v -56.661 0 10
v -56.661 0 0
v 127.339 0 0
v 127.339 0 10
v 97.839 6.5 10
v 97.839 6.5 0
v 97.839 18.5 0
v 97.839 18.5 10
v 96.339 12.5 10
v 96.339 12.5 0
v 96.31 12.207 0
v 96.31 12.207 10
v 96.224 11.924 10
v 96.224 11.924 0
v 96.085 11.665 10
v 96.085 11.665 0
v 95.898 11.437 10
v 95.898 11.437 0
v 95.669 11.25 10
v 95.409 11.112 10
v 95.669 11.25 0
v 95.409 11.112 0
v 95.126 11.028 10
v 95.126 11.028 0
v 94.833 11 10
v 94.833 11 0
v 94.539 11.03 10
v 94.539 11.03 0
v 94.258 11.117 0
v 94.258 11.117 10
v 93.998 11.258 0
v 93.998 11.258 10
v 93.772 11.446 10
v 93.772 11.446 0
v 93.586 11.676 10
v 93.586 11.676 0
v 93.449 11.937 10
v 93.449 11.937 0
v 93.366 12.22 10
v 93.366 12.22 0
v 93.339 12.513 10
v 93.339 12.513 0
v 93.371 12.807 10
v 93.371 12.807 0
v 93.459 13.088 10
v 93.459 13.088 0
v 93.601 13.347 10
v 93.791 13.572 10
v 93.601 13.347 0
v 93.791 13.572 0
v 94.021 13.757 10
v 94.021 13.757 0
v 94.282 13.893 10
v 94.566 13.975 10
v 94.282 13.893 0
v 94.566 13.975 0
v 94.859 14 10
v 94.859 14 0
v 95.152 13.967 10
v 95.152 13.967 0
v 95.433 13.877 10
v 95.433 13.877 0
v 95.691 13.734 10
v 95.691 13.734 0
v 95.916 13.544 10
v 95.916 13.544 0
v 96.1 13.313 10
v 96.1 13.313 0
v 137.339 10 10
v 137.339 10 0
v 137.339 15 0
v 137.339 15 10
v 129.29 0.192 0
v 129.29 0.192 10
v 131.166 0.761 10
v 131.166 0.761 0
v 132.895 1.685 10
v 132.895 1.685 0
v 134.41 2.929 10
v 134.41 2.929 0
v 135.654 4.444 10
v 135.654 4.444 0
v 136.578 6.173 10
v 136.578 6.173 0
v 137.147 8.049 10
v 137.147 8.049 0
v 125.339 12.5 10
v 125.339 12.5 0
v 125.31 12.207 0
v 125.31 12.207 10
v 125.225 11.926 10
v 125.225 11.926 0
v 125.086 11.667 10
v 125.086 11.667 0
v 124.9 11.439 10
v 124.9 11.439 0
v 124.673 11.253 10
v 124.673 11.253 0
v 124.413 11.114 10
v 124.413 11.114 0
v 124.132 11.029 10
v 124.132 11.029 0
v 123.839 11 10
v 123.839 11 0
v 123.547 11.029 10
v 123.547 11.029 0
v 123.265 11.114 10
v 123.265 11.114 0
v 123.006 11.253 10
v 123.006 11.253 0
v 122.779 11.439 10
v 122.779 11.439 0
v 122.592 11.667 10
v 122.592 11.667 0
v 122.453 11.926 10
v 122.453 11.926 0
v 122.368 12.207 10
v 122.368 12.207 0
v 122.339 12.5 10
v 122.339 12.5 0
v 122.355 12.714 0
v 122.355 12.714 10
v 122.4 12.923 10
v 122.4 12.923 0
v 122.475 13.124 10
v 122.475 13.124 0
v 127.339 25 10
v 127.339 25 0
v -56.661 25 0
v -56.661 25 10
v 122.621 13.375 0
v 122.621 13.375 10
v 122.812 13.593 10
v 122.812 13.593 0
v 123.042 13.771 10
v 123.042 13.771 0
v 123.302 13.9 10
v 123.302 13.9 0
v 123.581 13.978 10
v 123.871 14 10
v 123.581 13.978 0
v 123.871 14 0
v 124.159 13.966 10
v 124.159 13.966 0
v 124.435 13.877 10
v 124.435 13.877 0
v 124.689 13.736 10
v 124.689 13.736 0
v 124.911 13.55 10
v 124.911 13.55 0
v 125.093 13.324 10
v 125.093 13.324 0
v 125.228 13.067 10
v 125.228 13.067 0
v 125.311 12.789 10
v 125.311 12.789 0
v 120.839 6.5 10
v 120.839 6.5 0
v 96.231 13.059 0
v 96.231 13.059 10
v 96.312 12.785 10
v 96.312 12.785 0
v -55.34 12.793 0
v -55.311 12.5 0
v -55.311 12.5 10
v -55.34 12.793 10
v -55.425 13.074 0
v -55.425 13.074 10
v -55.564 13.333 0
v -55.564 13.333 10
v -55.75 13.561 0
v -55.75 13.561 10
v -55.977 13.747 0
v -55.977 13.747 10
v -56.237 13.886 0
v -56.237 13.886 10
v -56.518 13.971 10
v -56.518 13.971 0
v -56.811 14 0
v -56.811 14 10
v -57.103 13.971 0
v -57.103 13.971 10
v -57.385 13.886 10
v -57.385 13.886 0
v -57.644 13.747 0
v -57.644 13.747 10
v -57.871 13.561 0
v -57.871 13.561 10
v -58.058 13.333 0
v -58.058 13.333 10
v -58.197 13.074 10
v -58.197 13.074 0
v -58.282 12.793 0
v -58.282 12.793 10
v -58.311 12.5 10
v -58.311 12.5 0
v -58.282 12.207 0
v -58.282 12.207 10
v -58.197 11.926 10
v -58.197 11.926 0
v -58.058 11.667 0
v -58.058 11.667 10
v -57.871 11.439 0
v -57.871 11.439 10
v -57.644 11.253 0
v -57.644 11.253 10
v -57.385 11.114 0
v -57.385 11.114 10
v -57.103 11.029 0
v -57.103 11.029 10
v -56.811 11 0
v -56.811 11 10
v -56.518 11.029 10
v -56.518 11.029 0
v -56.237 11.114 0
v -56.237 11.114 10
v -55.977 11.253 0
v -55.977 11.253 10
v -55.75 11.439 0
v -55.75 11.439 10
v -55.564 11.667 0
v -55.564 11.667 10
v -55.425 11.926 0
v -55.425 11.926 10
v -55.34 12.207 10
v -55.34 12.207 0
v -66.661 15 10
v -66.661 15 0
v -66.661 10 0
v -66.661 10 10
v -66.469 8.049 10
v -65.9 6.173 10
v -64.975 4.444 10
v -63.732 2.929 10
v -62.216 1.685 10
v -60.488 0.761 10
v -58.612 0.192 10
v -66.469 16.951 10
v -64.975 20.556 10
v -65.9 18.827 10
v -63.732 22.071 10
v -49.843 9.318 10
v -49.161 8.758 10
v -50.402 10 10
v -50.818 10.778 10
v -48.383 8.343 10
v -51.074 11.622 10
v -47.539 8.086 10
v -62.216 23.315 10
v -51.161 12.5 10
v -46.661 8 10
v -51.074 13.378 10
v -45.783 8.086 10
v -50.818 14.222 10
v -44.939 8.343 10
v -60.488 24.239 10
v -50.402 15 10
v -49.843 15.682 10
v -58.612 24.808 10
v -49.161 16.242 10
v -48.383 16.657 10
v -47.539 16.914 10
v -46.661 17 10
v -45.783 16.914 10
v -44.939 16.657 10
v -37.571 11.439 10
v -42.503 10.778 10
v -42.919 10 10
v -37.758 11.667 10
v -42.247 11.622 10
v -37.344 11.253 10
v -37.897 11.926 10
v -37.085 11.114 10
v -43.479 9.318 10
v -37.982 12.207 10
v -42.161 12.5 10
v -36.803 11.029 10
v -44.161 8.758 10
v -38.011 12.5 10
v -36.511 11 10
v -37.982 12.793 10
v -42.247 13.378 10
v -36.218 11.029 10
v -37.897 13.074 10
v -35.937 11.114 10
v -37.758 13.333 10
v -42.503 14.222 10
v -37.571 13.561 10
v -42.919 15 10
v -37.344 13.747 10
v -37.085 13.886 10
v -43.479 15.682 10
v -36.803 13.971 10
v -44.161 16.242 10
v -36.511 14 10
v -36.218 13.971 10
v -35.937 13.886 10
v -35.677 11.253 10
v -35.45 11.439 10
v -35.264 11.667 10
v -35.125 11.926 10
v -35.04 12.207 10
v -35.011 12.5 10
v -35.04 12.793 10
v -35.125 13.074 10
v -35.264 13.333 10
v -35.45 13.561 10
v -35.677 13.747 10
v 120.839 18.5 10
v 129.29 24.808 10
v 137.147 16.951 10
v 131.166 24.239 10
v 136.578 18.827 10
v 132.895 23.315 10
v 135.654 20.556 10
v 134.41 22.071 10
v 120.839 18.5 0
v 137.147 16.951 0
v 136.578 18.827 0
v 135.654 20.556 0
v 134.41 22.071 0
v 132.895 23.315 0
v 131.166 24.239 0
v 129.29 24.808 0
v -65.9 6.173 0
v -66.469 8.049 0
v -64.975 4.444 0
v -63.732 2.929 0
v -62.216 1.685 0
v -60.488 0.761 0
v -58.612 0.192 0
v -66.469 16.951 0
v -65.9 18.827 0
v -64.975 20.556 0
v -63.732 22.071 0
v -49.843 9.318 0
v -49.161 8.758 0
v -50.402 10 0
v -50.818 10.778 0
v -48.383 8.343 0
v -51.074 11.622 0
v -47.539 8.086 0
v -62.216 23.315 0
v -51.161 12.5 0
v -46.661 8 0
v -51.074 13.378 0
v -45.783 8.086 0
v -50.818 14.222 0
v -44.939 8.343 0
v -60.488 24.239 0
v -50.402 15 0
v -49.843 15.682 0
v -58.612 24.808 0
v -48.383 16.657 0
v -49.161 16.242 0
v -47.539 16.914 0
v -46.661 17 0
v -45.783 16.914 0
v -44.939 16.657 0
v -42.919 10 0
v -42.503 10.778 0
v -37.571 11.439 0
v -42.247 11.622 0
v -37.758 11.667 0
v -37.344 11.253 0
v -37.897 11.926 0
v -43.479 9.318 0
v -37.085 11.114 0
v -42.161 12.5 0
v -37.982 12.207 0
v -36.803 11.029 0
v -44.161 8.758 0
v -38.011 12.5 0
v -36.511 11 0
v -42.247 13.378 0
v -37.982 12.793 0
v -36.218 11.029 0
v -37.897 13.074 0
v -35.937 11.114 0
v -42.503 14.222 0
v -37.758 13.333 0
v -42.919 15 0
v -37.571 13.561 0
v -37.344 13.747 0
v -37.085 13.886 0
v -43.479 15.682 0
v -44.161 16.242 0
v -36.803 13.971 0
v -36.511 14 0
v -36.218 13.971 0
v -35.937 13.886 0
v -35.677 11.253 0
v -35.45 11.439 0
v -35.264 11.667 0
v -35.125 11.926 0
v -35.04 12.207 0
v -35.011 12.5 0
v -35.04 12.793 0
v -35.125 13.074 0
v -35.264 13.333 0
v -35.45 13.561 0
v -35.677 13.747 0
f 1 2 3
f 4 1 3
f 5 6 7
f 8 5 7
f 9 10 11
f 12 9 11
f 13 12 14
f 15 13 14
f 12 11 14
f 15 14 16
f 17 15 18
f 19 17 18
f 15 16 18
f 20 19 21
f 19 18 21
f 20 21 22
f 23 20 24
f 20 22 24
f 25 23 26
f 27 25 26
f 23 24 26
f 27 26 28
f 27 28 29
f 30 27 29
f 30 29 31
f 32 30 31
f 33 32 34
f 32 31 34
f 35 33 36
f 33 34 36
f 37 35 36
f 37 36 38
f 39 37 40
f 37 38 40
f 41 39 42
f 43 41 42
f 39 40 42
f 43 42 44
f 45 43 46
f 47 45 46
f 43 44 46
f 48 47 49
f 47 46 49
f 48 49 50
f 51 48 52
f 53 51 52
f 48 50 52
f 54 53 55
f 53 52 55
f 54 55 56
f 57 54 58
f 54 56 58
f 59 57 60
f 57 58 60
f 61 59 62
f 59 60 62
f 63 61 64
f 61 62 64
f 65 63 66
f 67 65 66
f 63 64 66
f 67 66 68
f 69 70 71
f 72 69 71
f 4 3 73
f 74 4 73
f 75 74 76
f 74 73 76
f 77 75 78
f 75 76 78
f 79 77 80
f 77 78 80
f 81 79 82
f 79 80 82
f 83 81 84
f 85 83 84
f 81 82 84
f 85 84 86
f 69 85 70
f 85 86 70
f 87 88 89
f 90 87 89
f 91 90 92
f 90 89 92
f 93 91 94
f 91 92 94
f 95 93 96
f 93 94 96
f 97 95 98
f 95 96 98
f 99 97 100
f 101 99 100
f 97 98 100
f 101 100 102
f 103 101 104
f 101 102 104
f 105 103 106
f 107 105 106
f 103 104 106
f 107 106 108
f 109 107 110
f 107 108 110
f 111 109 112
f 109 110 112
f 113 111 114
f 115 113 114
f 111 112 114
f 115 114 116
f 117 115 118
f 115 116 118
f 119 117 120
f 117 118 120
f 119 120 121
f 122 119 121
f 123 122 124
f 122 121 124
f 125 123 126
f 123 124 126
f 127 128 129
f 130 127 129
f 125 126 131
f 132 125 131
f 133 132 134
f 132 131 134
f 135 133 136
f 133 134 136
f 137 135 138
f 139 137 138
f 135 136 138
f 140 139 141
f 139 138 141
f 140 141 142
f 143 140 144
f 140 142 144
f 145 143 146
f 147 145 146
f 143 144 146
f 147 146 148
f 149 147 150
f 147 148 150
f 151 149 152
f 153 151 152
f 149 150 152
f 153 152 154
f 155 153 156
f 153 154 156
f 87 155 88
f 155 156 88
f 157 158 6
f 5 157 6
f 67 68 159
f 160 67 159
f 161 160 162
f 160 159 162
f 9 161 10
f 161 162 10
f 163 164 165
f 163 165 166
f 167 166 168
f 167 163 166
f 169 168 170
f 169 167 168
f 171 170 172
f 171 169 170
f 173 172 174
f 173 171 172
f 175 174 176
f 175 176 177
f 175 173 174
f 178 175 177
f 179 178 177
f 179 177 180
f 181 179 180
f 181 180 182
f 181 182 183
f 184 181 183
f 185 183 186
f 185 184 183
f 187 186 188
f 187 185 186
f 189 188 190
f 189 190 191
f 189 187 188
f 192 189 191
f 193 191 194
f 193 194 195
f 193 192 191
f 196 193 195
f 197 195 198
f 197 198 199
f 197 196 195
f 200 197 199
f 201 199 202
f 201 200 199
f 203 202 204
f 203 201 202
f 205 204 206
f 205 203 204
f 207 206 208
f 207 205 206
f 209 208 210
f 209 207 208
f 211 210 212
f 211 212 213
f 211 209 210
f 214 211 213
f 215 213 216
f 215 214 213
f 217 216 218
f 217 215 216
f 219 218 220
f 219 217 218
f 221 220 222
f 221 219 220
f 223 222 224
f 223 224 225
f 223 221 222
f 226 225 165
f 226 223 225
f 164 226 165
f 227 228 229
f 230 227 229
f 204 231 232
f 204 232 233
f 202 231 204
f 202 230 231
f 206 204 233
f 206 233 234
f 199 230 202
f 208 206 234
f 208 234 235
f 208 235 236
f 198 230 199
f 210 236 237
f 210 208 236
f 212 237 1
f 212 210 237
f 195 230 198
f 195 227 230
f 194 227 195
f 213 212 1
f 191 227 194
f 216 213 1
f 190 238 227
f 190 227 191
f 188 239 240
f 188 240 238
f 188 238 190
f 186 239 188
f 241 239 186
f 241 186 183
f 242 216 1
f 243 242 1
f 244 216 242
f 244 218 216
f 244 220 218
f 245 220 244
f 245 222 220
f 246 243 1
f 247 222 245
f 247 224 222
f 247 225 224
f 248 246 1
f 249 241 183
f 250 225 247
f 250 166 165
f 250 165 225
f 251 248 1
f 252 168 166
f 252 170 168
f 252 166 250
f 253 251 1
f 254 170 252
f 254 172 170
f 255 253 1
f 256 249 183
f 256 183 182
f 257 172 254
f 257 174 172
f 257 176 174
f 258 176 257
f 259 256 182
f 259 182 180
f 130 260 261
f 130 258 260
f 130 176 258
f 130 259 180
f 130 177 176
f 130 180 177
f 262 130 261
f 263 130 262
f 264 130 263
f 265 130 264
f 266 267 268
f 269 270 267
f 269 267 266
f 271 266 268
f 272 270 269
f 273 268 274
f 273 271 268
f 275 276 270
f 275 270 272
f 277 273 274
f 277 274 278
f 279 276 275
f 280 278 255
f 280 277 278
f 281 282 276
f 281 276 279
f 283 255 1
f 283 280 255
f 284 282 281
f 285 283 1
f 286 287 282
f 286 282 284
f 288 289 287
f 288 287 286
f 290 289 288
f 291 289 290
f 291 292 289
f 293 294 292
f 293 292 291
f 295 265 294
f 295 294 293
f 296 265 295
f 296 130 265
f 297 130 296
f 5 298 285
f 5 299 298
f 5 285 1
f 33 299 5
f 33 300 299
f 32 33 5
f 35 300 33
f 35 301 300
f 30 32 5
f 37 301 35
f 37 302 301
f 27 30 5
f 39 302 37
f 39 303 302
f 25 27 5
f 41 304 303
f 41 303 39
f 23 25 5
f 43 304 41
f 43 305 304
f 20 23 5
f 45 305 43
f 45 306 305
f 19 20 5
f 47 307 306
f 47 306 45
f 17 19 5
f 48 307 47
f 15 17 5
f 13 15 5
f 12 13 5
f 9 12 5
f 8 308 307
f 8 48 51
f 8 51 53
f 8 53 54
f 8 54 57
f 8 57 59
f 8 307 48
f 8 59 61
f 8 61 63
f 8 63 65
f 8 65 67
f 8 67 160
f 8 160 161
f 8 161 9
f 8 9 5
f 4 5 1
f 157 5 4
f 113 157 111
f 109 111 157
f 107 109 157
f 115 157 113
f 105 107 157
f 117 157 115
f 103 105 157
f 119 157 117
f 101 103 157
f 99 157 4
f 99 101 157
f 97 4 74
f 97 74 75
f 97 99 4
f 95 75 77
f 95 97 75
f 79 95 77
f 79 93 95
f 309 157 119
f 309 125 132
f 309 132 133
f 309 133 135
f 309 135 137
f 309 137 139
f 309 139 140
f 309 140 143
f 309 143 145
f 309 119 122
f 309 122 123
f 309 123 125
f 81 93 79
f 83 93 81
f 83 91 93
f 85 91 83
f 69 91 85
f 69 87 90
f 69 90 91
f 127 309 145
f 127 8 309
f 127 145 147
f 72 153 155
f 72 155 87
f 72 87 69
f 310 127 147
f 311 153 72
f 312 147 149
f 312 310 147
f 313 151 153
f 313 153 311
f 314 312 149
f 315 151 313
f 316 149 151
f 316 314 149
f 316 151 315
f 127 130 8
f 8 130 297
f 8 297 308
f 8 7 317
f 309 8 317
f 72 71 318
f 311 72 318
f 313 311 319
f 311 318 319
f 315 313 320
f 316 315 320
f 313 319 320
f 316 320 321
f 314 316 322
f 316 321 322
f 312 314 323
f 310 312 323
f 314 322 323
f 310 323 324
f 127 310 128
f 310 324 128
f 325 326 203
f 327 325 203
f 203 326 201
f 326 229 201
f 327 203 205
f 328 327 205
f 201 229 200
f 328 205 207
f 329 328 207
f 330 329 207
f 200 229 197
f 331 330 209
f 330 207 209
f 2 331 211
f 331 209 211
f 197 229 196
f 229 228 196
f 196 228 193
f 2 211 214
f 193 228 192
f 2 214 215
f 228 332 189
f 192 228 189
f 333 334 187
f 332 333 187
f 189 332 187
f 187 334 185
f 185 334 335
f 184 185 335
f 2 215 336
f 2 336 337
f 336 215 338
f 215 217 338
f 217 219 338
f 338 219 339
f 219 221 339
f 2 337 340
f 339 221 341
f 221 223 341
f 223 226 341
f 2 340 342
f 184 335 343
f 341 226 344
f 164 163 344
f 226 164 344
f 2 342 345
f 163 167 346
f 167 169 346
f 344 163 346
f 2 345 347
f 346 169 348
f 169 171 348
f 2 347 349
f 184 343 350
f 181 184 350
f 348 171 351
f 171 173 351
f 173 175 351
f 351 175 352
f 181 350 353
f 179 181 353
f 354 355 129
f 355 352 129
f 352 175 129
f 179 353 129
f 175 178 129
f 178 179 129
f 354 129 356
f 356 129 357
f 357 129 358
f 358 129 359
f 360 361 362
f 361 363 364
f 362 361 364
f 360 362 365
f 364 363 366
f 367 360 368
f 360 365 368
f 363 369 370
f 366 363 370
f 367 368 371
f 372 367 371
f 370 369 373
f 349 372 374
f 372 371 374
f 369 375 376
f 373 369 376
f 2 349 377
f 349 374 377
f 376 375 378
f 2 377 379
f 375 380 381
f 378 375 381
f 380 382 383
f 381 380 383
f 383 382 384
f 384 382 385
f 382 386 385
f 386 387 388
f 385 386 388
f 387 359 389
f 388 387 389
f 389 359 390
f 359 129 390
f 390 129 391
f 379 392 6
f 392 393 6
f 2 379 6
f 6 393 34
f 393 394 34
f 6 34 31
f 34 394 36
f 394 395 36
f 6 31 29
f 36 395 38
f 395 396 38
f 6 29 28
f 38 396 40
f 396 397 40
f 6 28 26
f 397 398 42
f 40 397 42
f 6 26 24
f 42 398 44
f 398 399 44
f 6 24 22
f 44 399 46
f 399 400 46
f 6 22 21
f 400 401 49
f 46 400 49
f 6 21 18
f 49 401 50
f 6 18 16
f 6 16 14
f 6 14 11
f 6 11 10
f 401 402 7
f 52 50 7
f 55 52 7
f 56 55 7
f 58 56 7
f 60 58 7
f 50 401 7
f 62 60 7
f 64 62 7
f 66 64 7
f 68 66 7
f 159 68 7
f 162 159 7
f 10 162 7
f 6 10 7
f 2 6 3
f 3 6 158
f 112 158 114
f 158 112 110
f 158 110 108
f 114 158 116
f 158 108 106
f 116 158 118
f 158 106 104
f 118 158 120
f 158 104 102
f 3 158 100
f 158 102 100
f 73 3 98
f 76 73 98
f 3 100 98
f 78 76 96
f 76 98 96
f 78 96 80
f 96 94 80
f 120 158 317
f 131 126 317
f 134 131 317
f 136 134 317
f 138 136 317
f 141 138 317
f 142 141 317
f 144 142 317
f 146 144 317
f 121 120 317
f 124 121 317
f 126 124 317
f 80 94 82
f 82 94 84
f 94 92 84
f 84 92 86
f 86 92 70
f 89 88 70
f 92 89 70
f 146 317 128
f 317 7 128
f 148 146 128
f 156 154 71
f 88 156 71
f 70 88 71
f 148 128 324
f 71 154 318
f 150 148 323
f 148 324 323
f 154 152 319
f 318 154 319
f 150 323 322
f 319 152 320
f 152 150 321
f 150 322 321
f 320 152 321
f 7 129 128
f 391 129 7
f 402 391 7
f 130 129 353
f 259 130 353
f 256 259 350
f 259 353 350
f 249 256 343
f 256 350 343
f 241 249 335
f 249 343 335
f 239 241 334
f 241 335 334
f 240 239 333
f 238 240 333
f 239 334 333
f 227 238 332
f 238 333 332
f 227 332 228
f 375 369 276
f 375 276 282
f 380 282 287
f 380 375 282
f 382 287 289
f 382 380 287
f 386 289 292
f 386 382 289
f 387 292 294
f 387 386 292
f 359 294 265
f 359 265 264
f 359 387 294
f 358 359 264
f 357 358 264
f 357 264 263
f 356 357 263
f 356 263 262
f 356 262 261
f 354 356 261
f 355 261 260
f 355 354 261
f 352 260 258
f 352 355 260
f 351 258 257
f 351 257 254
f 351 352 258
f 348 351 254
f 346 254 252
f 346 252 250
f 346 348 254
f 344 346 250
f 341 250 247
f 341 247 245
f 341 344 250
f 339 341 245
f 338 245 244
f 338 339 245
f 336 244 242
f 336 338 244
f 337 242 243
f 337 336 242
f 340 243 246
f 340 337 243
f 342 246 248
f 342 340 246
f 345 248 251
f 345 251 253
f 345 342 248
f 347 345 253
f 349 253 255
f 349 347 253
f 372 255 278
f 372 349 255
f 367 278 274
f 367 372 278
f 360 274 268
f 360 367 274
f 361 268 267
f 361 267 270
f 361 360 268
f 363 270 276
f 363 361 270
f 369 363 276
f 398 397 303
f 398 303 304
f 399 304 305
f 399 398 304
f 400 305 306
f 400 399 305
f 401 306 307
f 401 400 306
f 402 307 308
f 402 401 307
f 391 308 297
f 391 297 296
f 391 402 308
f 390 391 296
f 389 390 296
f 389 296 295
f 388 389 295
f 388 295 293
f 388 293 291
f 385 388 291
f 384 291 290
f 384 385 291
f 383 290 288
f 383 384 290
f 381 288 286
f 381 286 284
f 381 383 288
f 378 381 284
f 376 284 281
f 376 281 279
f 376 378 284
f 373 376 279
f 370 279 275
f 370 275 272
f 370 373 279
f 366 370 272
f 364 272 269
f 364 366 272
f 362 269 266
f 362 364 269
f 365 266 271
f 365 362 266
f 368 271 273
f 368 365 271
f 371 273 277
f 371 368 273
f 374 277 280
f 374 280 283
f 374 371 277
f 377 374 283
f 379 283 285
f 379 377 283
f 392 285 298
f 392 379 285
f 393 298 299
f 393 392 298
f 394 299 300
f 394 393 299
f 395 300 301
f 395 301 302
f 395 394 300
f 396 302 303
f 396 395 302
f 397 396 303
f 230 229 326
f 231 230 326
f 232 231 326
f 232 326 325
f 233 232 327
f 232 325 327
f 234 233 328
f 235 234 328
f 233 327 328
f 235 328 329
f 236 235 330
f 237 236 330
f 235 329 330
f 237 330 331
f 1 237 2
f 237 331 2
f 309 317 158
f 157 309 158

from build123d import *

# Parameters (mm, degrees)
SKETCH2_R           = 1.5
SKETCH2_R_2         = 4.5
BOSS_EXTRUDE1_DEPTH = 10


with BuildPart() as part:
    # Sketch2 → Boss-Extrude1 (new body)
    with BuildSketch(Plane.XY):
        with BuildLine():
            Line((-56.660710118, 0), (0, 0))
            Line((0, 0), (127.339289882, 0))
            ThreePointArc((127.339289882, 0), (134.410357694, 2.928932188), (137.339289882, 10))
            Line((137.339289882, 10), (137.339289882, 15))
            ThreePointArc((137.339289882, 15), (134.410357694, 22.071067812), (127.339289882, 25))
            Line((127.339289882, 25), (-56.660710118, 25))
            ThreePointArc((-56.660710118, 25), (-63.73177793, 22.071067812), (-66.660710118, 15))
            Line((-66.660710118, 15), (-66.660710118, 10))
            ThreePointArc((-66.660710118, 10), (-63.73177793, 2.928932188), (-56.660710118, 0))
        make_face()
        Polygon((97.839289882, 6.5), (97.839289882, 12.5), (97.839289882, 18.5), (120.839289882, 18.5), (120.839289882, 12.5), (120.839289882, 6.5), align=None, mode=Mode.SUBTRACT)
        with Locations((-56.810710118, 12.5)):
            Circle(SKETCH2_R, mode=Mode.SUBTRACT)
        with Locations((-46.660710118, 12.5)):
            Circle(SKETCH2_R_2, mode=Mode.SUBTRACT)
        with Locations((-36.510710118, 12.5)):
            Circle(SKETCH2_R, mode=Mode.SUBTRACT)
        with BuildLine():
            ThreePointArc((96.099859372, 13.312997269), (96.278187765, 12.923760406), (96.339289882, 12.5))
            ThreePointArc((96.339289882, 12.5), (93.400391999, 12.076239594), (96.099859372, 13.312997269))
        make_face(mode=Mode.SUBTRACT)
        with BuildLine():
            ThreePointArc((125.339289882, 12.5), (123.839289882, 11), (122.339289882, 12.5))
            ThreePointArc((122.339289882, 12.5), (122.373700536, 12.819449323), (122.475353708, 13.124242033))
            ThreePointArc((122.475353708, 13.124242033), (124.158739205, 13.965589346), (125.339289882, 12.5))
        make_face(mode=Mode.SUBTRACT)
    extrude(amount=BOSS_EXTRUDE1_DEPTH)


solid = part.part
